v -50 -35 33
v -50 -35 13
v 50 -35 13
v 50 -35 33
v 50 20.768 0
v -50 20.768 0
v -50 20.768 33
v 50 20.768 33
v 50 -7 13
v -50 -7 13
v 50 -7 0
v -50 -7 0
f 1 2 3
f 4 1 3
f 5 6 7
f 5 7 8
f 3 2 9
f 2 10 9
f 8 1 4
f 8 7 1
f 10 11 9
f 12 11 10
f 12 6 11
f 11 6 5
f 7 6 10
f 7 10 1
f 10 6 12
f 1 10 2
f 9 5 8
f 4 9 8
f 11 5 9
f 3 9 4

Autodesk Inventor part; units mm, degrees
ref_plane "YZ Plane" through (0, 0, 0) normal (1, 0, 0) x (0, 1, 0)
ref_plane "XZ Plane" through (0, 0, 0) normal (0, 1, 0) x (-1, 0, 0)
ref_plane "XY Plane" through (0, 0, 0) normal (0, 0, 1) x (1, 0, 0)
sketch "Sketch1" plane through (0, 0, 0) normal (0, 0, 1) x (1, 0, 0)
  line L0 (25, -7) -> (50, -7) projected
  line L1 (50, 45.5218) -> (50, -7) projected
  line L2 (50, 45.5218) -> (11.4158, 45.5218) projected
  line L3 (11.4158, 45.5218) -> (11.4158, 48.5218) projected
  line L4 (11.4158, 48.5218) -> (-11.4158, 48.5218) projected
  line L5 (-11.4158, 48.5218) -> (-11.4158, 45.5218) projected
  line L6 (-11.4158, 45.5218) -> (-50, 45.5218) projected
  line L7 (-50, 45.5218) -> (-50, -7) projected
  line L8 (-50, -7) -> (-25, -7) projected
  line L9 (-25, -7) -> (-25, -24) projected
  line L10 (-25, -24) -> (-32.4371, -24) projected
  line L11 (-32.4371, -24) -> (-32.4371, -28) projected
  line L12 (-32.4371, -28) -> (-25, -28) projected
  line L13 (-25, -28) -> (-25, -35) projected
  line L14 (-25, -35) -> (25, -35) projected
  line L15 (25, -35) -> (25, -28) projected
  line L16 (25, -28) -> (30.7079, -28) projected
  line L17 (30.7079, -28) -> (30.7079, -24) projected
  line L18 (30.7079, -24) -> (25, -24) projected
  line L19 (25, -24) -> (25, -7) projected
  circle A0 centre (-11.4158, 26.1989) radius 1.6 projected
  circle A1 centre (20.9961, 37.6953) radius 1.6 projected
  circle A2 centre (-20.9961, 37.6953) radius 1.6 projected
  circle A3 centre (11.4158, 26.1989) radius 1.6 projected
  line L20 (15.6, -21.3595) -> (2, -21.3595) projected
  line L21 (-2, -21.3109) -> (-15.6, -21.3109) projected
  line L22 (-2.4, -19.4751) -> (-15.6, -19.4751)
  line L23 (2.4, -19.5236) -> (15.6, -19.5236)
  line L24 (50, -7) -> (-50, -7)
  line L25 (-50, -7) -> (-50, 20.7683)
  line L26 (-50, 20.7683) -> (50, 20.7683)
  line L27 (50, 20.7683) -> (50, -7)
  point P0 (0, 0)
extrude "Extrusion1" add sketch "Sketch1" along normal blind 13 contours L24 L8 L7 L26 L1 L0
sketch "Sketch2" plane through (0, 0, 13) normal (0, 0, 1) x (1, 0, 0)
  line L0 (25, -7) -> (50, -7) projected
  line L1 (50, 45.5218) -> (50, -7) projected
  line L2 (50, 45.5218) -> (11.4158, 45.5218) projected
  line L3 (11.4158, 45.5218) -> (11.4158, 48.5218) projected
  line L4 (11.4158, 48.5218) -> (-11.4158, 48.5218) projected
  line L5 (-11.4158, 48.5218) -> (-11.4158, 45.5218) projected
  line L6 (-11.4158, 45.5218) -> (-50, 45.5218) projected
  line L7 (-50, 45.5218) -> (-50, -7) projected
  line L8 (-50, -7) -> (-25, -7) projected
  line L9 (-25, -7) -> (-25, -24) projected
  line L10 (-25, -24) -> (-32.4371, -24) projected
  line L11 (-32.4371, -24) -> (-32.4371, -28) projected
  line L12 (-32.4371, -28) -> (-25, -28) projected
  line L13 (-25, -28) -> (-25, -35) projected
  line L14 (-25, -35) -> (25, -35) projected
  line L15 (25, -35) -> (25, -28) projected
  line L16 (25, -28) -> (30.7079, -28) projected
  line L17 (30.7079, -28) -> (30.7079, -24) projected
  line L18 (30.7079, -24) -> (25, -24) projected
  line L19 (25, -24) -> (25, -7) projected
  circle A0 centre (-11.4158, 26.1989) radius 1.6 projected
  circle A1 centre (20.9961, 37.6953) radius 1.6 projected
  circle A2 centre (-20.9961, 37.6953) radius 1.6 projected
  circle A3 centre (11.4158, 26.1989) radius 1.6 projected
  line L20 (50, 20.7683) -> (-50, 20.7683) projected
  line L21 (-50, 20.7683) -> (50, 20.7683)
  line L22 (50, 20.7683) -> (50, -35)
  line L23 (50, -35) -> (-50, -35)
  line L24 (-50, -35) -> (-50, 20.7683)
  point P0 (0, 0)
extrude "Extrusion2" add sketch "Sketch2" along normal blind 20 contours L19 L18 L17 L16 L15 L14 L13 L12 L11 L10 L9 L8 L7 L20 L1 L0 | L0 L22 L23 L15 L16 L17 L18 L19 | L8 L9 L10 L11 L12 L13 L23 L24
